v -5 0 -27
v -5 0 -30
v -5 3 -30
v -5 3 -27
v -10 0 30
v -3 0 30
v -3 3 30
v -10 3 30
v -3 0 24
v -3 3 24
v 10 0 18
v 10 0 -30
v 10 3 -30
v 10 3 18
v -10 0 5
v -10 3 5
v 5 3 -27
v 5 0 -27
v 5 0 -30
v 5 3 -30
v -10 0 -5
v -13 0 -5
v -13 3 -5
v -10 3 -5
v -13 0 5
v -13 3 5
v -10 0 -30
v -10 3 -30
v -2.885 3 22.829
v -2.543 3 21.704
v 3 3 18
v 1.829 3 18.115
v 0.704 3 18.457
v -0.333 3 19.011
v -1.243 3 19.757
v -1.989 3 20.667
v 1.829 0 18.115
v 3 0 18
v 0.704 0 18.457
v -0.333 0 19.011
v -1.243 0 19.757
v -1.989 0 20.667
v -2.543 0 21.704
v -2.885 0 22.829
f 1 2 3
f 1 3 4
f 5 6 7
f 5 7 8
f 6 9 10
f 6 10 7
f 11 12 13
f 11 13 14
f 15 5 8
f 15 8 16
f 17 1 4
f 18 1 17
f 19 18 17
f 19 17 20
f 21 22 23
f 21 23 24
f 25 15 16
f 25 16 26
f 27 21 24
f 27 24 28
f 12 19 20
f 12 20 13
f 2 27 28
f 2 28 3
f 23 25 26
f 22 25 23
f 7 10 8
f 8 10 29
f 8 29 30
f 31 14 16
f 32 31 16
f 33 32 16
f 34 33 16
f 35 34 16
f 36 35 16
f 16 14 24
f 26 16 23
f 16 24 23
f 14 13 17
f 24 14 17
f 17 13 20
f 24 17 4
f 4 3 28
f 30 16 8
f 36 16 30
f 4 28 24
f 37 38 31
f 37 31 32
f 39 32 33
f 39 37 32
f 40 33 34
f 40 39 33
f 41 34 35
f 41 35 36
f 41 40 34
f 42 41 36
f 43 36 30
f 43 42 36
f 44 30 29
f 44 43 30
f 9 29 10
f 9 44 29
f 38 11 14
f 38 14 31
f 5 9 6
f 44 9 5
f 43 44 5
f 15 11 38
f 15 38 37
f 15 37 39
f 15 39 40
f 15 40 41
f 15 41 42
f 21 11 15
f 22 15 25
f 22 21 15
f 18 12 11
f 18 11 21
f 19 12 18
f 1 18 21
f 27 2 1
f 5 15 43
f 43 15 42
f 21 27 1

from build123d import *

# Parameters (mm, degrees)
BOSS_EXTRUDE1_DEPTH = 3


with BuildPart() as part:
    # Sketch1 → Boss-Extrude1 (new body)
    with BuildSketch(Plane(origin=(0, 0, 0), x_dir=(1, 0, 0), z_dir=(0, 1, 0))):
        with BuildLine():
            Line((-3, -24), (-3, -30))
            Line((-3, -30), (-10, -30))
            Line((-10, -30), (-10, -5))
            Line((-10, -5), (-13, -5))
            Line((-13, -5), (-13, 5))
            Line((-13, 5), (-10, 5))
            Line((-10, 5), (-10, 30))
            Line((-10, 30), (-5, 30))
            Line((-5, 30), (-5, 27))
            Line((-5, 27), (5, 27))
            Line((5, 27), (5, 30))
            Line((5, 30), (10, 30))
            Line((10, 30), (10, -18))
            Line((10, -18), (3, -18))
            ThreePointArc((3, -18), (-1.242640687, -19.757359313), (-3, -24))
        make_face()
    extrude(amount=BOSS_EXTRUDE1_DEPTH)


solid = part.part
